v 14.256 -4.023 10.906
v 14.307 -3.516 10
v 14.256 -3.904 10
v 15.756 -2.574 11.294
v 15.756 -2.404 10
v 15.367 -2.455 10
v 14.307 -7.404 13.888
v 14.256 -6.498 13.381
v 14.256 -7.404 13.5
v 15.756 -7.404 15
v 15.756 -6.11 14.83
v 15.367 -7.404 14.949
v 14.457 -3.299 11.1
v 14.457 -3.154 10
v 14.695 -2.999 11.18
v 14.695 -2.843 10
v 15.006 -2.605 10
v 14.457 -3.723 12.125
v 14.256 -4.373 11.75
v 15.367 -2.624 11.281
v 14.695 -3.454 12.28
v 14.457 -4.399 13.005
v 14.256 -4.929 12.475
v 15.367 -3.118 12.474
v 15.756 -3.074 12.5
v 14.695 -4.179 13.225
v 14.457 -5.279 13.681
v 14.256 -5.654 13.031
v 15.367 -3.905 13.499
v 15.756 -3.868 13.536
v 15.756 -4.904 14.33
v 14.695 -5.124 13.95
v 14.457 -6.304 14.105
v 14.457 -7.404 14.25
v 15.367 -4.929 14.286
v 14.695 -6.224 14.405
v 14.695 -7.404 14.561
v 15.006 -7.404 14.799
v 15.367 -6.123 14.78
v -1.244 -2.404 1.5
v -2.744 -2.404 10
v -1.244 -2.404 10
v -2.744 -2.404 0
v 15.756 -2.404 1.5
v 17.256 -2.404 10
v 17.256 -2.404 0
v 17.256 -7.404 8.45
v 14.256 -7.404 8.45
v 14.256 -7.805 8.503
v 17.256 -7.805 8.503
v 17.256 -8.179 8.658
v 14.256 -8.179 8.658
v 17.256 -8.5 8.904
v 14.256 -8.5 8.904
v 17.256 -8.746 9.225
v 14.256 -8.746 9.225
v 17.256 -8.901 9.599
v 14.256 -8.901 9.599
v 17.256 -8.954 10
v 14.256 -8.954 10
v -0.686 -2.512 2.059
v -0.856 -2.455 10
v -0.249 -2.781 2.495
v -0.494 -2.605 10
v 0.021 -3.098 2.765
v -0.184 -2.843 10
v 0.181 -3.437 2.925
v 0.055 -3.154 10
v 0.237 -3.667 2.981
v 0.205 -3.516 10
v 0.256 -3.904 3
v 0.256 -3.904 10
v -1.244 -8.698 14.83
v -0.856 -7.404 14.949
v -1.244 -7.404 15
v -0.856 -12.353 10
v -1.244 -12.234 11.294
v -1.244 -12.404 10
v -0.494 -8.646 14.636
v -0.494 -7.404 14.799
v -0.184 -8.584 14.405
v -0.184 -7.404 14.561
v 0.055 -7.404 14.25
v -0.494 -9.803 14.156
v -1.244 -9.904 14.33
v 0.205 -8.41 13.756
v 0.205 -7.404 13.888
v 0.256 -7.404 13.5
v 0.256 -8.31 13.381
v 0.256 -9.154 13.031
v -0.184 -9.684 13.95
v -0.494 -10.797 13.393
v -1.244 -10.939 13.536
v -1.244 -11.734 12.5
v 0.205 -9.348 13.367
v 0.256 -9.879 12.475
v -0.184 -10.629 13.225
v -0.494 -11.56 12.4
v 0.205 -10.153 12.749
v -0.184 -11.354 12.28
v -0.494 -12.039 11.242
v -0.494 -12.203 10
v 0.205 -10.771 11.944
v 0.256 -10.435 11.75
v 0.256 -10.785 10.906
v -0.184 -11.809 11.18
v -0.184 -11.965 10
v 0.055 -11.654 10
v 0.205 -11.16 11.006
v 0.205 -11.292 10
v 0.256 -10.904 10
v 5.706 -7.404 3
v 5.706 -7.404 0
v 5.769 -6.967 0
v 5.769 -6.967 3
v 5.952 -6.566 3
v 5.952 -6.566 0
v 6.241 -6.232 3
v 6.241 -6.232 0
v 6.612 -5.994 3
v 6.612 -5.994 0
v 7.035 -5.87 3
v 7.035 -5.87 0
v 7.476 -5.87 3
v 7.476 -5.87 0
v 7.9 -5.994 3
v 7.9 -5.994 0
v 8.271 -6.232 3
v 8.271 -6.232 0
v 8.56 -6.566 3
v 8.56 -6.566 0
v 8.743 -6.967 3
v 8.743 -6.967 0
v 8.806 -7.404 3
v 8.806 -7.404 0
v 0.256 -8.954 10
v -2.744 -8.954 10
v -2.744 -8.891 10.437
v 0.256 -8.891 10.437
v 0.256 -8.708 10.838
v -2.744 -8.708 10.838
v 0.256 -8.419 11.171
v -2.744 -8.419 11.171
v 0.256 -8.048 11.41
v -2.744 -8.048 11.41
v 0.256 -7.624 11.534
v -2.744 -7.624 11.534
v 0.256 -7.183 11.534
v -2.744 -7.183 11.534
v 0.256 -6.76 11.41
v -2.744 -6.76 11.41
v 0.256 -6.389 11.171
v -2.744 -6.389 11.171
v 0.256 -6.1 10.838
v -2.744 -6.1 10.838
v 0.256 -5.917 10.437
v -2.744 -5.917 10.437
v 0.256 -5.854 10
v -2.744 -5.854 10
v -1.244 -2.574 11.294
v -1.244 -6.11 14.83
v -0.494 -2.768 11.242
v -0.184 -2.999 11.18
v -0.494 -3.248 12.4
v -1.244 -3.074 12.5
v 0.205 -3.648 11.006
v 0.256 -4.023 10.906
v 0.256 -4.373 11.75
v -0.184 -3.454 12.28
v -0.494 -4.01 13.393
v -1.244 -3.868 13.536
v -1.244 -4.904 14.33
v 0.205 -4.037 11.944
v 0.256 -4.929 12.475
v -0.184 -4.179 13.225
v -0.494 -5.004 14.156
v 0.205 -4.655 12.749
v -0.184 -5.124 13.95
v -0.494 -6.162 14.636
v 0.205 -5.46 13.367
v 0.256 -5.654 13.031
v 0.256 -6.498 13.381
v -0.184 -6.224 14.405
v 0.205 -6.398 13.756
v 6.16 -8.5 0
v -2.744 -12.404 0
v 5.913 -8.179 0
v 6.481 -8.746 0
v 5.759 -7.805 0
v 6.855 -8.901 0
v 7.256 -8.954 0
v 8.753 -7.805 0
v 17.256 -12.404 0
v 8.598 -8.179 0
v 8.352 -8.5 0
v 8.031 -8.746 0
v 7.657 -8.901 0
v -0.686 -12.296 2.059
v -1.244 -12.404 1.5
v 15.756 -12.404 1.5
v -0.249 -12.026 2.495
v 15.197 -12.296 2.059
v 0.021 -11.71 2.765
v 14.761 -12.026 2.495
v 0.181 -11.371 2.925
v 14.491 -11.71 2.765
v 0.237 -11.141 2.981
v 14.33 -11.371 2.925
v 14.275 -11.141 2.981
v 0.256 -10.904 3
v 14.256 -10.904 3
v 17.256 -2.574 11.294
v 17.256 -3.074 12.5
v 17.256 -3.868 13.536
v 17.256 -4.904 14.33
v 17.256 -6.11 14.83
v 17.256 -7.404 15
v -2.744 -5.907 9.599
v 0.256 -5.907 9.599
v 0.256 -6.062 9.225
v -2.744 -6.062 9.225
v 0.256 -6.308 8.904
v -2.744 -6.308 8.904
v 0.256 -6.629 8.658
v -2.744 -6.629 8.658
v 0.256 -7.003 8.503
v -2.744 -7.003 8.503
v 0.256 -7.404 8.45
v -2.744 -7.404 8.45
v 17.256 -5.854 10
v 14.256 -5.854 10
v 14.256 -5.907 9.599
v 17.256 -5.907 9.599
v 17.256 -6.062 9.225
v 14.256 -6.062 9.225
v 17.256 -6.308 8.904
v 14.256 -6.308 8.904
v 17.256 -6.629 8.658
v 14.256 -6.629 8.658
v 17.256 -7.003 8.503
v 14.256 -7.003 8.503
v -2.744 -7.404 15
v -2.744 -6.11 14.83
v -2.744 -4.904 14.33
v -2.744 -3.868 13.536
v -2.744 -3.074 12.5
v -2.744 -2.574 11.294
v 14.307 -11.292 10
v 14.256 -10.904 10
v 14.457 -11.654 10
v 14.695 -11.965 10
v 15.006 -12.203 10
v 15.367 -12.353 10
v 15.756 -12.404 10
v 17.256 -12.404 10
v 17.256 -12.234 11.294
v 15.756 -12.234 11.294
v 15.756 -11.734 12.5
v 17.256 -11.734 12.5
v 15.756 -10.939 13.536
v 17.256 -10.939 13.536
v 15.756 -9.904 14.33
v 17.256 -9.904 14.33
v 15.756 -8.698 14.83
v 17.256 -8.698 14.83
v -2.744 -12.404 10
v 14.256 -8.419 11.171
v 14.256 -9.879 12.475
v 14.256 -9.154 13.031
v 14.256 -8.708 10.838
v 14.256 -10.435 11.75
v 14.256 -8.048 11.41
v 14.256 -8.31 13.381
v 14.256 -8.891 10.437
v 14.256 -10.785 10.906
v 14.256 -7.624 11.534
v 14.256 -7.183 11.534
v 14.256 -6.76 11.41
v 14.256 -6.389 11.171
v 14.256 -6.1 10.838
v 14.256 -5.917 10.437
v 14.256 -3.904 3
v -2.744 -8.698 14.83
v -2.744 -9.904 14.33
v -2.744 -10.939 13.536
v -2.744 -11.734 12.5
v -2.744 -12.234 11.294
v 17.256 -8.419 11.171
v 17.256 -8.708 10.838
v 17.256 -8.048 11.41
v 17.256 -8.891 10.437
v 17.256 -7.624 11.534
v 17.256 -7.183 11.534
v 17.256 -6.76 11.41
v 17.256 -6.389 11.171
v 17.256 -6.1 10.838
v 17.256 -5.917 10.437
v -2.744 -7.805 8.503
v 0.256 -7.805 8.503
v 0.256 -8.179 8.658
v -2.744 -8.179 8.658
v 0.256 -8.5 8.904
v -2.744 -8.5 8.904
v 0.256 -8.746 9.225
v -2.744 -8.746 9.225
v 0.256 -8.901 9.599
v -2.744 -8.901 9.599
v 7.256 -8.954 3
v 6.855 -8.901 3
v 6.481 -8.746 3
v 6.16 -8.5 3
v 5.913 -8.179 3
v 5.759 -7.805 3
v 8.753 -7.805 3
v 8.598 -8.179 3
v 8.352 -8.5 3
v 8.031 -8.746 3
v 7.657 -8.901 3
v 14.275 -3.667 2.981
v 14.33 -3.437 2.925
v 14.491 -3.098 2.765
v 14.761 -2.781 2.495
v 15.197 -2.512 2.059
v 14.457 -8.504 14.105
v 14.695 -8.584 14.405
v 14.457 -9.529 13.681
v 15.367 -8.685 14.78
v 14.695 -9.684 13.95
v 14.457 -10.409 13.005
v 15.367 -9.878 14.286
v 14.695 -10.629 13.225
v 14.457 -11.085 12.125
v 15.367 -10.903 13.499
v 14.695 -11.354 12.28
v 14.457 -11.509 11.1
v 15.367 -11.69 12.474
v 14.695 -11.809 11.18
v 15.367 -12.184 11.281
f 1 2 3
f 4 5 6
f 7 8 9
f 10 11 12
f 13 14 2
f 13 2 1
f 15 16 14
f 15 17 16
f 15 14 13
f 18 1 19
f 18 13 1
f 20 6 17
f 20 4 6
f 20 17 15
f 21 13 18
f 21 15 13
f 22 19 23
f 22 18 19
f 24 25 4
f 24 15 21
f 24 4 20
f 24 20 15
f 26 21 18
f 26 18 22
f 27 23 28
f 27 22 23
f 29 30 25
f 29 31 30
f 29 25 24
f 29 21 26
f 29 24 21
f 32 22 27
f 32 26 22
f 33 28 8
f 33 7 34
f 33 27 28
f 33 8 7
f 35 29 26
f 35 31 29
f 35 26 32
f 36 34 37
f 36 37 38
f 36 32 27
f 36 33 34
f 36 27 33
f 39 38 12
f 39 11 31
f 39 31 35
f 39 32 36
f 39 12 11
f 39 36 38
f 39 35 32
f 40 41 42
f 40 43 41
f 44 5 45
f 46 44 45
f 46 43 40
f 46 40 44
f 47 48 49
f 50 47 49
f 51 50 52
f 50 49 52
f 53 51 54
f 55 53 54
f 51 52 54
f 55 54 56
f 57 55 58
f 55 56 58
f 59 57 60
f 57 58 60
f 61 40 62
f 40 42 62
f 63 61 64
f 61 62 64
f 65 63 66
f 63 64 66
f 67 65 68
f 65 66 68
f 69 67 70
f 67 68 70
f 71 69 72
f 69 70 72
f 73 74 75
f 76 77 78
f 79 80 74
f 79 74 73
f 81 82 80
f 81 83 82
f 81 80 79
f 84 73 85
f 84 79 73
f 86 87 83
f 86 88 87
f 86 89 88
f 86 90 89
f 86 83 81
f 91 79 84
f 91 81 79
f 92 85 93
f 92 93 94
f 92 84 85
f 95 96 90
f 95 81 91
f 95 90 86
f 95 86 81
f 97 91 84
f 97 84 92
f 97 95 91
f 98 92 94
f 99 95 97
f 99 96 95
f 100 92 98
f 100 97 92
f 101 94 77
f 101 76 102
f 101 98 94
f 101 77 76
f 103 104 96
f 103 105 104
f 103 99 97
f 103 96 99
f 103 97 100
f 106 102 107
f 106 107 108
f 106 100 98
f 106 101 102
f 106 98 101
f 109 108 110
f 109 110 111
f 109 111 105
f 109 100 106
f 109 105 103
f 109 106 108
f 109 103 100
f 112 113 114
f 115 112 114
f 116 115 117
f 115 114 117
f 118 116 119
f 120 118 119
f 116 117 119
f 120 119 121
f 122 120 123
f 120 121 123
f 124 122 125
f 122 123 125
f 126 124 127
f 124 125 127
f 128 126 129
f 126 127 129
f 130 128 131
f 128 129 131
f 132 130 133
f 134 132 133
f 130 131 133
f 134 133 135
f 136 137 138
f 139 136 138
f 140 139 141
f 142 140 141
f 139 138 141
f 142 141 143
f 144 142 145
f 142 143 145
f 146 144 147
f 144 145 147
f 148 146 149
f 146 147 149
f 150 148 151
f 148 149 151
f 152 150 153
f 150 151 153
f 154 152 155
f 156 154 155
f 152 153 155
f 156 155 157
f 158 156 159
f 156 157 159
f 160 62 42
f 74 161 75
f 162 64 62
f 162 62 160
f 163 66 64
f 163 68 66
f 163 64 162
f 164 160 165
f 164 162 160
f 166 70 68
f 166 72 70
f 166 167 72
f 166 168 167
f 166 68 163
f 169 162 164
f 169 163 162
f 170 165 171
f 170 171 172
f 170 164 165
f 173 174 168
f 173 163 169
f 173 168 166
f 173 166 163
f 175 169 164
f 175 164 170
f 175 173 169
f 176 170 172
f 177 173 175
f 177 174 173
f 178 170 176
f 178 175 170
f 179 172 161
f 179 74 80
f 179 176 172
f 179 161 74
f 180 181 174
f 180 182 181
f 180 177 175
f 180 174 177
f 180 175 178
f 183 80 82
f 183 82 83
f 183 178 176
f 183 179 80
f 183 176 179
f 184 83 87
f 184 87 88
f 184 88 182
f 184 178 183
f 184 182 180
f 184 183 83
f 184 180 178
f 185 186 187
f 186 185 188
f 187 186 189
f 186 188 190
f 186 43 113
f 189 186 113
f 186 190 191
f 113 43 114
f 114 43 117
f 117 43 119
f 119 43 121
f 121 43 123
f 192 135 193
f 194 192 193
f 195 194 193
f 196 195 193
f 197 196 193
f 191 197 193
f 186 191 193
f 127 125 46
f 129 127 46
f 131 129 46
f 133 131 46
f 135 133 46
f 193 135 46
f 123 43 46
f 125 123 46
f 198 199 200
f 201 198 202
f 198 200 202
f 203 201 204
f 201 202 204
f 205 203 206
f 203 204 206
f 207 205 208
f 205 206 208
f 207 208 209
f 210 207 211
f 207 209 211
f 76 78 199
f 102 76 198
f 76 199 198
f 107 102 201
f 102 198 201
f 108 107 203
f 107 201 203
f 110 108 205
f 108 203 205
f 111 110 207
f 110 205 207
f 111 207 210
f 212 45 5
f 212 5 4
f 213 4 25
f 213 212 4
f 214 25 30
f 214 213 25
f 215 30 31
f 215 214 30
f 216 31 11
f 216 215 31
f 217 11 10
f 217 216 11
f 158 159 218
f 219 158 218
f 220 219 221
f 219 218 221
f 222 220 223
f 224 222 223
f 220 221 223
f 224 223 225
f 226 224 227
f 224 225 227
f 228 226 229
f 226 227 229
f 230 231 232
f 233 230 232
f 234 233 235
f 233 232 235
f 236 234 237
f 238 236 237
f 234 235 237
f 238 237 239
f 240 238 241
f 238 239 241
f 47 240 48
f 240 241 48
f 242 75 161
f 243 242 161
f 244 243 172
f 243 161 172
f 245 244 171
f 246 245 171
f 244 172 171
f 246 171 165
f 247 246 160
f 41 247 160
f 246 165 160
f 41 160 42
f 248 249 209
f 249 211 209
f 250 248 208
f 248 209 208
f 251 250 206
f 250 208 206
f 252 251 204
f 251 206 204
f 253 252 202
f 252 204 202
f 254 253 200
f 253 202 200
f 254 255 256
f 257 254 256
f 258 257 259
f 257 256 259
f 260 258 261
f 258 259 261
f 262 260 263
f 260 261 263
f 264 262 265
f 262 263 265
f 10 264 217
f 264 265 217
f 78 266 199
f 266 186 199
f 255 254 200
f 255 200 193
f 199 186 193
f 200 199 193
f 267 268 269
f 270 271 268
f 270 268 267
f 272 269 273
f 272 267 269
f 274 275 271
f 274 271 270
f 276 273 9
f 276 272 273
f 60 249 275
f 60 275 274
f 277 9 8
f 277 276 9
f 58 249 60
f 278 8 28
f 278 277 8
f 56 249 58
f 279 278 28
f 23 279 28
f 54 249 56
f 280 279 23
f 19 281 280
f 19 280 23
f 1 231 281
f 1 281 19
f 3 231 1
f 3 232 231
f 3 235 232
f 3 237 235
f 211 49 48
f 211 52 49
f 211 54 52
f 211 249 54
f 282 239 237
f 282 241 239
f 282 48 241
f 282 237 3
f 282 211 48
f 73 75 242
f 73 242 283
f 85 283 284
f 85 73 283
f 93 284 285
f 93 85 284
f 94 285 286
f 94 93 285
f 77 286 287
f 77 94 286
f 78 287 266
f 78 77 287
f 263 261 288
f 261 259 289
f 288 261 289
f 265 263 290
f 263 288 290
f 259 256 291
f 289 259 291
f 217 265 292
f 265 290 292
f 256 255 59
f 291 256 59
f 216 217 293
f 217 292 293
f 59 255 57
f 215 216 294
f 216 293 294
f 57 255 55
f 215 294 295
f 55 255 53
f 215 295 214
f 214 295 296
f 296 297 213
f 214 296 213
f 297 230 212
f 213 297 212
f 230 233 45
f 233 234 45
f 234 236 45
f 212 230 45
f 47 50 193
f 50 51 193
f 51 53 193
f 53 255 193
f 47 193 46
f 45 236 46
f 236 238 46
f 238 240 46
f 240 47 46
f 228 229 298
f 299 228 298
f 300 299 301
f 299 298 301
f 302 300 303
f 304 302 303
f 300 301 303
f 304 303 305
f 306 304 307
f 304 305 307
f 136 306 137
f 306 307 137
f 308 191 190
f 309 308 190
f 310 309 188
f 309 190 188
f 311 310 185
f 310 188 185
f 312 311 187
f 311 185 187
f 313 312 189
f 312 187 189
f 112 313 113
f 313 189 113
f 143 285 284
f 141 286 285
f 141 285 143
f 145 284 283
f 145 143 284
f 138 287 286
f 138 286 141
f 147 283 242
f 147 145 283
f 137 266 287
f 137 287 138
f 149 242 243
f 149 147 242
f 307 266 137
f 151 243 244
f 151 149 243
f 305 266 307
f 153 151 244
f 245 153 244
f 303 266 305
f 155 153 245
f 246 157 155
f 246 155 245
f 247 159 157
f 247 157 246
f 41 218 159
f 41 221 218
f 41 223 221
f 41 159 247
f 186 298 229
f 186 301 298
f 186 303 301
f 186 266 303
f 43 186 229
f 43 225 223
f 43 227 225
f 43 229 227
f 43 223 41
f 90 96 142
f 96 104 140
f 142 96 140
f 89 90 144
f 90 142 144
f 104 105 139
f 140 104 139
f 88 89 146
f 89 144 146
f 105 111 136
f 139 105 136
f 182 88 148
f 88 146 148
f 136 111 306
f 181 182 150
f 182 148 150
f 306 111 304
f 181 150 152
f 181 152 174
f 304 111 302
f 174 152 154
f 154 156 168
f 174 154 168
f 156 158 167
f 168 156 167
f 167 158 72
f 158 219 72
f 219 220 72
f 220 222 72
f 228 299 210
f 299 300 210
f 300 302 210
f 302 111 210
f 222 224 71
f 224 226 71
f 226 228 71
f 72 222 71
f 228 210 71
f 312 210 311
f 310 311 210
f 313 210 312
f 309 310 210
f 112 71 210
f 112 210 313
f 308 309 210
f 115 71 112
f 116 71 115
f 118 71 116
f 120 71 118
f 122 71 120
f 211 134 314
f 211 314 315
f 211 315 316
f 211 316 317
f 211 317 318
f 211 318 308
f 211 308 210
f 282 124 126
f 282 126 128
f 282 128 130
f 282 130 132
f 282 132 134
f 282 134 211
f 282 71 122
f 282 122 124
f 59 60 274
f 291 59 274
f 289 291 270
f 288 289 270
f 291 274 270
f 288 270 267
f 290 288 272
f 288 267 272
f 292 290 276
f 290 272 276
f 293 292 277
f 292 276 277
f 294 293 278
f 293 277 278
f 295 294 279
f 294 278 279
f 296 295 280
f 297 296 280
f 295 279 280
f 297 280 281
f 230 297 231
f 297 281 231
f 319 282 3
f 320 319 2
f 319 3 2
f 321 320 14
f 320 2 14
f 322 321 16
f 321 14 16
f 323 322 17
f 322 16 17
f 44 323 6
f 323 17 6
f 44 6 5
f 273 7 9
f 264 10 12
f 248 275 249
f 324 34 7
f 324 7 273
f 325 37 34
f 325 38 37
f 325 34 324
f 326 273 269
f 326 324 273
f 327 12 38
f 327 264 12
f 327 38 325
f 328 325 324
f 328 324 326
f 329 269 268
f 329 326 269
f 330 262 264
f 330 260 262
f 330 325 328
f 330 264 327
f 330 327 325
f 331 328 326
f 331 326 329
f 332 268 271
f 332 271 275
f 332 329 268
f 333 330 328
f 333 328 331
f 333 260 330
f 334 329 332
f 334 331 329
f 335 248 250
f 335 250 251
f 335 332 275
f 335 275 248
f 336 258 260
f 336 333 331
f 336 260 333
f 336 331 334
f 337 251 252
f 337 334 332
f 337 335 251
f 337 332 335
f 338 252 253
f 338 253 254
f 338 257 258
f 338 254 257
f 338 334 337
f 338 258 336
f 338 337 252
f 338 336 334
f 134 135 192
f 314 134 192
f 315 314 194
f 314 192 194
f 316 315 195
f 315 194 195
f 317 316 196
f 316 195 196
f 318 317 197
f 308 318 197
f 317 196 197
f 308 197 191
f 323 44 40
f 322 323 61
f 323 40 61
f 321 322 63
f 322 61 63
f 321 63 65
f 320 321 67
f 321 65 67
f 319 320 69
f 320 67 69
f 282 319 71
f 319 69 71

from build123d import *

# Parameters (mm, degrees)
F1_DEPTH = 3
F2_W     = 3
F2_H     = 10
F3_DEPTH = 12
F5_DEPTH = 25
F6_R     = 4.99999
F7_R     = 1.5


# Not quite as in the source:
# - a fillet or chamfer is up to 0.001 mm smaller than in the source, because OpenCascade refuses the exact size


with BuildPart() as f1:
    # F0 (on Top) → F1 (new body)
    with BuildSketch(Plane.XY):
        with BuildLine():
            Line((5.7057162493, -7.4039038014), (-2.7442837507, -7.4039038014))
            Line((-2.7442837507, -7.4039038014), (-2.7442837507, -12.4039038014))
            Line((-2.7442837507, -12.4039038014), (7.2557162493, -12.4039038014))
            Line((7.2557162493, -12.4039038014), (7.2557162493, -8.9539038014))
            ThreePointArc((7.2557162493, -8.9539038014), (6.1597007385, -8.4999193123), (5.7057162493, -7.4039038014))
        make_face()
        with BuildLine():
            Line((17.2557162493, -2.4039038014), (-2.7442837507, -2.4039038014))
            Line((-2.7442837507, -2.4039038014), (-2.7442837507, -7.4039038014))
            Line((-2.7442837507, -7.4039038014), (5.7057162493, -7.4039038014))
            ThreePointArc((5.7057162493, -7.4039038014), (7.2557162493, -5.8539038014), (8.8057162493, -7.4039038014))
            ThreePointArc((8.8057162493, -7.4039038014), (8.3517317602, -8.4999193123), (7.2557162493, -8.9539038014))
            Line((7.2557162493, -8.9539038014), (7.2557162493, -12.4039038014))
            Line((7.2557162493, -12.4039038014), (17.2557162493, -12.4039038014))
            Line((17.2557162493, -12.4039038014), (17.2557162493, -2.4039038014))
        make_face()
    extrude(amount=F1_DEPTH)

    # F2 (on face) → F3 (join)
    with BuildSketch(Plane.XY.offset(3)):
        with Locations((-1.2442837507, -7.4039038014)):
            Rectangle(F2_W, F2_H)
        with Locations((15.7557162493, -7.4039038014)):
            Rectangle(F2_W, F2_H)
    extrude(amount=F3_DEPTH)

    # F4 (on face) → F5 (cut)
    with BuildSketch(Plane(origin=(-2.7442837507, 0, 0), x_dir=(0, -1, 0), z_dir=(-1, 0, 0))):
        with BuildLine():
            ThreePointArc((5.8539038014, 10), (6.3078882906, 8.9039844892), (7.4039038014, 8.45))
            Line((7.4039038014, 8.45), (7.4039038014, 10))
            Line((7.4039038014, 10), (5.8539038014, 10))
        make_face()
        with BuildLine():
            Line((7.4039038014, 10), (7.4039038014, 8.45))
            ThreePointArc((7.4039038014, 8.45), (8.4999193123, 8.9039844892), (8.9539038014, 10))
            ThreePointArc((8.9539038014, 10), (7.4039038014, 11.55), (5.8539038014, 10))
            Line((5.8539038014, 10), (7.4039038014, 10))
        make_face()
    extrude(amount=-F5_DEPTH, mode=Mode.SUBTRACT)

    # F6 (radius 5 in the source; OpenCascade refuses exactly that, so slightly less here)
    f6_edges = [f1.edges().sort_by_distance(p)[0] for p in [
        (-1.244284, -2.403904, 15),
        (15.755716, -2.403904, 15),
        (15.755716, -12.403904, 15),
        (-1.244284, -12.403904, 15),
    ]]
    fillet(f6_edges, radius=F6_R)

    # F7
    f7_edges = [f1.edges().sort_by_distance(p)[0] for p in [
        (7.255716, -2.403904, 3),
        (7.255716, -12.403904, 3),
        (0.255716, -10.939441, 13.535537),
        (14.255716, -3.868367, 13.535537),
    ]]
    fillet(f7_edges, radius=F7_R)


solid = f1.part
